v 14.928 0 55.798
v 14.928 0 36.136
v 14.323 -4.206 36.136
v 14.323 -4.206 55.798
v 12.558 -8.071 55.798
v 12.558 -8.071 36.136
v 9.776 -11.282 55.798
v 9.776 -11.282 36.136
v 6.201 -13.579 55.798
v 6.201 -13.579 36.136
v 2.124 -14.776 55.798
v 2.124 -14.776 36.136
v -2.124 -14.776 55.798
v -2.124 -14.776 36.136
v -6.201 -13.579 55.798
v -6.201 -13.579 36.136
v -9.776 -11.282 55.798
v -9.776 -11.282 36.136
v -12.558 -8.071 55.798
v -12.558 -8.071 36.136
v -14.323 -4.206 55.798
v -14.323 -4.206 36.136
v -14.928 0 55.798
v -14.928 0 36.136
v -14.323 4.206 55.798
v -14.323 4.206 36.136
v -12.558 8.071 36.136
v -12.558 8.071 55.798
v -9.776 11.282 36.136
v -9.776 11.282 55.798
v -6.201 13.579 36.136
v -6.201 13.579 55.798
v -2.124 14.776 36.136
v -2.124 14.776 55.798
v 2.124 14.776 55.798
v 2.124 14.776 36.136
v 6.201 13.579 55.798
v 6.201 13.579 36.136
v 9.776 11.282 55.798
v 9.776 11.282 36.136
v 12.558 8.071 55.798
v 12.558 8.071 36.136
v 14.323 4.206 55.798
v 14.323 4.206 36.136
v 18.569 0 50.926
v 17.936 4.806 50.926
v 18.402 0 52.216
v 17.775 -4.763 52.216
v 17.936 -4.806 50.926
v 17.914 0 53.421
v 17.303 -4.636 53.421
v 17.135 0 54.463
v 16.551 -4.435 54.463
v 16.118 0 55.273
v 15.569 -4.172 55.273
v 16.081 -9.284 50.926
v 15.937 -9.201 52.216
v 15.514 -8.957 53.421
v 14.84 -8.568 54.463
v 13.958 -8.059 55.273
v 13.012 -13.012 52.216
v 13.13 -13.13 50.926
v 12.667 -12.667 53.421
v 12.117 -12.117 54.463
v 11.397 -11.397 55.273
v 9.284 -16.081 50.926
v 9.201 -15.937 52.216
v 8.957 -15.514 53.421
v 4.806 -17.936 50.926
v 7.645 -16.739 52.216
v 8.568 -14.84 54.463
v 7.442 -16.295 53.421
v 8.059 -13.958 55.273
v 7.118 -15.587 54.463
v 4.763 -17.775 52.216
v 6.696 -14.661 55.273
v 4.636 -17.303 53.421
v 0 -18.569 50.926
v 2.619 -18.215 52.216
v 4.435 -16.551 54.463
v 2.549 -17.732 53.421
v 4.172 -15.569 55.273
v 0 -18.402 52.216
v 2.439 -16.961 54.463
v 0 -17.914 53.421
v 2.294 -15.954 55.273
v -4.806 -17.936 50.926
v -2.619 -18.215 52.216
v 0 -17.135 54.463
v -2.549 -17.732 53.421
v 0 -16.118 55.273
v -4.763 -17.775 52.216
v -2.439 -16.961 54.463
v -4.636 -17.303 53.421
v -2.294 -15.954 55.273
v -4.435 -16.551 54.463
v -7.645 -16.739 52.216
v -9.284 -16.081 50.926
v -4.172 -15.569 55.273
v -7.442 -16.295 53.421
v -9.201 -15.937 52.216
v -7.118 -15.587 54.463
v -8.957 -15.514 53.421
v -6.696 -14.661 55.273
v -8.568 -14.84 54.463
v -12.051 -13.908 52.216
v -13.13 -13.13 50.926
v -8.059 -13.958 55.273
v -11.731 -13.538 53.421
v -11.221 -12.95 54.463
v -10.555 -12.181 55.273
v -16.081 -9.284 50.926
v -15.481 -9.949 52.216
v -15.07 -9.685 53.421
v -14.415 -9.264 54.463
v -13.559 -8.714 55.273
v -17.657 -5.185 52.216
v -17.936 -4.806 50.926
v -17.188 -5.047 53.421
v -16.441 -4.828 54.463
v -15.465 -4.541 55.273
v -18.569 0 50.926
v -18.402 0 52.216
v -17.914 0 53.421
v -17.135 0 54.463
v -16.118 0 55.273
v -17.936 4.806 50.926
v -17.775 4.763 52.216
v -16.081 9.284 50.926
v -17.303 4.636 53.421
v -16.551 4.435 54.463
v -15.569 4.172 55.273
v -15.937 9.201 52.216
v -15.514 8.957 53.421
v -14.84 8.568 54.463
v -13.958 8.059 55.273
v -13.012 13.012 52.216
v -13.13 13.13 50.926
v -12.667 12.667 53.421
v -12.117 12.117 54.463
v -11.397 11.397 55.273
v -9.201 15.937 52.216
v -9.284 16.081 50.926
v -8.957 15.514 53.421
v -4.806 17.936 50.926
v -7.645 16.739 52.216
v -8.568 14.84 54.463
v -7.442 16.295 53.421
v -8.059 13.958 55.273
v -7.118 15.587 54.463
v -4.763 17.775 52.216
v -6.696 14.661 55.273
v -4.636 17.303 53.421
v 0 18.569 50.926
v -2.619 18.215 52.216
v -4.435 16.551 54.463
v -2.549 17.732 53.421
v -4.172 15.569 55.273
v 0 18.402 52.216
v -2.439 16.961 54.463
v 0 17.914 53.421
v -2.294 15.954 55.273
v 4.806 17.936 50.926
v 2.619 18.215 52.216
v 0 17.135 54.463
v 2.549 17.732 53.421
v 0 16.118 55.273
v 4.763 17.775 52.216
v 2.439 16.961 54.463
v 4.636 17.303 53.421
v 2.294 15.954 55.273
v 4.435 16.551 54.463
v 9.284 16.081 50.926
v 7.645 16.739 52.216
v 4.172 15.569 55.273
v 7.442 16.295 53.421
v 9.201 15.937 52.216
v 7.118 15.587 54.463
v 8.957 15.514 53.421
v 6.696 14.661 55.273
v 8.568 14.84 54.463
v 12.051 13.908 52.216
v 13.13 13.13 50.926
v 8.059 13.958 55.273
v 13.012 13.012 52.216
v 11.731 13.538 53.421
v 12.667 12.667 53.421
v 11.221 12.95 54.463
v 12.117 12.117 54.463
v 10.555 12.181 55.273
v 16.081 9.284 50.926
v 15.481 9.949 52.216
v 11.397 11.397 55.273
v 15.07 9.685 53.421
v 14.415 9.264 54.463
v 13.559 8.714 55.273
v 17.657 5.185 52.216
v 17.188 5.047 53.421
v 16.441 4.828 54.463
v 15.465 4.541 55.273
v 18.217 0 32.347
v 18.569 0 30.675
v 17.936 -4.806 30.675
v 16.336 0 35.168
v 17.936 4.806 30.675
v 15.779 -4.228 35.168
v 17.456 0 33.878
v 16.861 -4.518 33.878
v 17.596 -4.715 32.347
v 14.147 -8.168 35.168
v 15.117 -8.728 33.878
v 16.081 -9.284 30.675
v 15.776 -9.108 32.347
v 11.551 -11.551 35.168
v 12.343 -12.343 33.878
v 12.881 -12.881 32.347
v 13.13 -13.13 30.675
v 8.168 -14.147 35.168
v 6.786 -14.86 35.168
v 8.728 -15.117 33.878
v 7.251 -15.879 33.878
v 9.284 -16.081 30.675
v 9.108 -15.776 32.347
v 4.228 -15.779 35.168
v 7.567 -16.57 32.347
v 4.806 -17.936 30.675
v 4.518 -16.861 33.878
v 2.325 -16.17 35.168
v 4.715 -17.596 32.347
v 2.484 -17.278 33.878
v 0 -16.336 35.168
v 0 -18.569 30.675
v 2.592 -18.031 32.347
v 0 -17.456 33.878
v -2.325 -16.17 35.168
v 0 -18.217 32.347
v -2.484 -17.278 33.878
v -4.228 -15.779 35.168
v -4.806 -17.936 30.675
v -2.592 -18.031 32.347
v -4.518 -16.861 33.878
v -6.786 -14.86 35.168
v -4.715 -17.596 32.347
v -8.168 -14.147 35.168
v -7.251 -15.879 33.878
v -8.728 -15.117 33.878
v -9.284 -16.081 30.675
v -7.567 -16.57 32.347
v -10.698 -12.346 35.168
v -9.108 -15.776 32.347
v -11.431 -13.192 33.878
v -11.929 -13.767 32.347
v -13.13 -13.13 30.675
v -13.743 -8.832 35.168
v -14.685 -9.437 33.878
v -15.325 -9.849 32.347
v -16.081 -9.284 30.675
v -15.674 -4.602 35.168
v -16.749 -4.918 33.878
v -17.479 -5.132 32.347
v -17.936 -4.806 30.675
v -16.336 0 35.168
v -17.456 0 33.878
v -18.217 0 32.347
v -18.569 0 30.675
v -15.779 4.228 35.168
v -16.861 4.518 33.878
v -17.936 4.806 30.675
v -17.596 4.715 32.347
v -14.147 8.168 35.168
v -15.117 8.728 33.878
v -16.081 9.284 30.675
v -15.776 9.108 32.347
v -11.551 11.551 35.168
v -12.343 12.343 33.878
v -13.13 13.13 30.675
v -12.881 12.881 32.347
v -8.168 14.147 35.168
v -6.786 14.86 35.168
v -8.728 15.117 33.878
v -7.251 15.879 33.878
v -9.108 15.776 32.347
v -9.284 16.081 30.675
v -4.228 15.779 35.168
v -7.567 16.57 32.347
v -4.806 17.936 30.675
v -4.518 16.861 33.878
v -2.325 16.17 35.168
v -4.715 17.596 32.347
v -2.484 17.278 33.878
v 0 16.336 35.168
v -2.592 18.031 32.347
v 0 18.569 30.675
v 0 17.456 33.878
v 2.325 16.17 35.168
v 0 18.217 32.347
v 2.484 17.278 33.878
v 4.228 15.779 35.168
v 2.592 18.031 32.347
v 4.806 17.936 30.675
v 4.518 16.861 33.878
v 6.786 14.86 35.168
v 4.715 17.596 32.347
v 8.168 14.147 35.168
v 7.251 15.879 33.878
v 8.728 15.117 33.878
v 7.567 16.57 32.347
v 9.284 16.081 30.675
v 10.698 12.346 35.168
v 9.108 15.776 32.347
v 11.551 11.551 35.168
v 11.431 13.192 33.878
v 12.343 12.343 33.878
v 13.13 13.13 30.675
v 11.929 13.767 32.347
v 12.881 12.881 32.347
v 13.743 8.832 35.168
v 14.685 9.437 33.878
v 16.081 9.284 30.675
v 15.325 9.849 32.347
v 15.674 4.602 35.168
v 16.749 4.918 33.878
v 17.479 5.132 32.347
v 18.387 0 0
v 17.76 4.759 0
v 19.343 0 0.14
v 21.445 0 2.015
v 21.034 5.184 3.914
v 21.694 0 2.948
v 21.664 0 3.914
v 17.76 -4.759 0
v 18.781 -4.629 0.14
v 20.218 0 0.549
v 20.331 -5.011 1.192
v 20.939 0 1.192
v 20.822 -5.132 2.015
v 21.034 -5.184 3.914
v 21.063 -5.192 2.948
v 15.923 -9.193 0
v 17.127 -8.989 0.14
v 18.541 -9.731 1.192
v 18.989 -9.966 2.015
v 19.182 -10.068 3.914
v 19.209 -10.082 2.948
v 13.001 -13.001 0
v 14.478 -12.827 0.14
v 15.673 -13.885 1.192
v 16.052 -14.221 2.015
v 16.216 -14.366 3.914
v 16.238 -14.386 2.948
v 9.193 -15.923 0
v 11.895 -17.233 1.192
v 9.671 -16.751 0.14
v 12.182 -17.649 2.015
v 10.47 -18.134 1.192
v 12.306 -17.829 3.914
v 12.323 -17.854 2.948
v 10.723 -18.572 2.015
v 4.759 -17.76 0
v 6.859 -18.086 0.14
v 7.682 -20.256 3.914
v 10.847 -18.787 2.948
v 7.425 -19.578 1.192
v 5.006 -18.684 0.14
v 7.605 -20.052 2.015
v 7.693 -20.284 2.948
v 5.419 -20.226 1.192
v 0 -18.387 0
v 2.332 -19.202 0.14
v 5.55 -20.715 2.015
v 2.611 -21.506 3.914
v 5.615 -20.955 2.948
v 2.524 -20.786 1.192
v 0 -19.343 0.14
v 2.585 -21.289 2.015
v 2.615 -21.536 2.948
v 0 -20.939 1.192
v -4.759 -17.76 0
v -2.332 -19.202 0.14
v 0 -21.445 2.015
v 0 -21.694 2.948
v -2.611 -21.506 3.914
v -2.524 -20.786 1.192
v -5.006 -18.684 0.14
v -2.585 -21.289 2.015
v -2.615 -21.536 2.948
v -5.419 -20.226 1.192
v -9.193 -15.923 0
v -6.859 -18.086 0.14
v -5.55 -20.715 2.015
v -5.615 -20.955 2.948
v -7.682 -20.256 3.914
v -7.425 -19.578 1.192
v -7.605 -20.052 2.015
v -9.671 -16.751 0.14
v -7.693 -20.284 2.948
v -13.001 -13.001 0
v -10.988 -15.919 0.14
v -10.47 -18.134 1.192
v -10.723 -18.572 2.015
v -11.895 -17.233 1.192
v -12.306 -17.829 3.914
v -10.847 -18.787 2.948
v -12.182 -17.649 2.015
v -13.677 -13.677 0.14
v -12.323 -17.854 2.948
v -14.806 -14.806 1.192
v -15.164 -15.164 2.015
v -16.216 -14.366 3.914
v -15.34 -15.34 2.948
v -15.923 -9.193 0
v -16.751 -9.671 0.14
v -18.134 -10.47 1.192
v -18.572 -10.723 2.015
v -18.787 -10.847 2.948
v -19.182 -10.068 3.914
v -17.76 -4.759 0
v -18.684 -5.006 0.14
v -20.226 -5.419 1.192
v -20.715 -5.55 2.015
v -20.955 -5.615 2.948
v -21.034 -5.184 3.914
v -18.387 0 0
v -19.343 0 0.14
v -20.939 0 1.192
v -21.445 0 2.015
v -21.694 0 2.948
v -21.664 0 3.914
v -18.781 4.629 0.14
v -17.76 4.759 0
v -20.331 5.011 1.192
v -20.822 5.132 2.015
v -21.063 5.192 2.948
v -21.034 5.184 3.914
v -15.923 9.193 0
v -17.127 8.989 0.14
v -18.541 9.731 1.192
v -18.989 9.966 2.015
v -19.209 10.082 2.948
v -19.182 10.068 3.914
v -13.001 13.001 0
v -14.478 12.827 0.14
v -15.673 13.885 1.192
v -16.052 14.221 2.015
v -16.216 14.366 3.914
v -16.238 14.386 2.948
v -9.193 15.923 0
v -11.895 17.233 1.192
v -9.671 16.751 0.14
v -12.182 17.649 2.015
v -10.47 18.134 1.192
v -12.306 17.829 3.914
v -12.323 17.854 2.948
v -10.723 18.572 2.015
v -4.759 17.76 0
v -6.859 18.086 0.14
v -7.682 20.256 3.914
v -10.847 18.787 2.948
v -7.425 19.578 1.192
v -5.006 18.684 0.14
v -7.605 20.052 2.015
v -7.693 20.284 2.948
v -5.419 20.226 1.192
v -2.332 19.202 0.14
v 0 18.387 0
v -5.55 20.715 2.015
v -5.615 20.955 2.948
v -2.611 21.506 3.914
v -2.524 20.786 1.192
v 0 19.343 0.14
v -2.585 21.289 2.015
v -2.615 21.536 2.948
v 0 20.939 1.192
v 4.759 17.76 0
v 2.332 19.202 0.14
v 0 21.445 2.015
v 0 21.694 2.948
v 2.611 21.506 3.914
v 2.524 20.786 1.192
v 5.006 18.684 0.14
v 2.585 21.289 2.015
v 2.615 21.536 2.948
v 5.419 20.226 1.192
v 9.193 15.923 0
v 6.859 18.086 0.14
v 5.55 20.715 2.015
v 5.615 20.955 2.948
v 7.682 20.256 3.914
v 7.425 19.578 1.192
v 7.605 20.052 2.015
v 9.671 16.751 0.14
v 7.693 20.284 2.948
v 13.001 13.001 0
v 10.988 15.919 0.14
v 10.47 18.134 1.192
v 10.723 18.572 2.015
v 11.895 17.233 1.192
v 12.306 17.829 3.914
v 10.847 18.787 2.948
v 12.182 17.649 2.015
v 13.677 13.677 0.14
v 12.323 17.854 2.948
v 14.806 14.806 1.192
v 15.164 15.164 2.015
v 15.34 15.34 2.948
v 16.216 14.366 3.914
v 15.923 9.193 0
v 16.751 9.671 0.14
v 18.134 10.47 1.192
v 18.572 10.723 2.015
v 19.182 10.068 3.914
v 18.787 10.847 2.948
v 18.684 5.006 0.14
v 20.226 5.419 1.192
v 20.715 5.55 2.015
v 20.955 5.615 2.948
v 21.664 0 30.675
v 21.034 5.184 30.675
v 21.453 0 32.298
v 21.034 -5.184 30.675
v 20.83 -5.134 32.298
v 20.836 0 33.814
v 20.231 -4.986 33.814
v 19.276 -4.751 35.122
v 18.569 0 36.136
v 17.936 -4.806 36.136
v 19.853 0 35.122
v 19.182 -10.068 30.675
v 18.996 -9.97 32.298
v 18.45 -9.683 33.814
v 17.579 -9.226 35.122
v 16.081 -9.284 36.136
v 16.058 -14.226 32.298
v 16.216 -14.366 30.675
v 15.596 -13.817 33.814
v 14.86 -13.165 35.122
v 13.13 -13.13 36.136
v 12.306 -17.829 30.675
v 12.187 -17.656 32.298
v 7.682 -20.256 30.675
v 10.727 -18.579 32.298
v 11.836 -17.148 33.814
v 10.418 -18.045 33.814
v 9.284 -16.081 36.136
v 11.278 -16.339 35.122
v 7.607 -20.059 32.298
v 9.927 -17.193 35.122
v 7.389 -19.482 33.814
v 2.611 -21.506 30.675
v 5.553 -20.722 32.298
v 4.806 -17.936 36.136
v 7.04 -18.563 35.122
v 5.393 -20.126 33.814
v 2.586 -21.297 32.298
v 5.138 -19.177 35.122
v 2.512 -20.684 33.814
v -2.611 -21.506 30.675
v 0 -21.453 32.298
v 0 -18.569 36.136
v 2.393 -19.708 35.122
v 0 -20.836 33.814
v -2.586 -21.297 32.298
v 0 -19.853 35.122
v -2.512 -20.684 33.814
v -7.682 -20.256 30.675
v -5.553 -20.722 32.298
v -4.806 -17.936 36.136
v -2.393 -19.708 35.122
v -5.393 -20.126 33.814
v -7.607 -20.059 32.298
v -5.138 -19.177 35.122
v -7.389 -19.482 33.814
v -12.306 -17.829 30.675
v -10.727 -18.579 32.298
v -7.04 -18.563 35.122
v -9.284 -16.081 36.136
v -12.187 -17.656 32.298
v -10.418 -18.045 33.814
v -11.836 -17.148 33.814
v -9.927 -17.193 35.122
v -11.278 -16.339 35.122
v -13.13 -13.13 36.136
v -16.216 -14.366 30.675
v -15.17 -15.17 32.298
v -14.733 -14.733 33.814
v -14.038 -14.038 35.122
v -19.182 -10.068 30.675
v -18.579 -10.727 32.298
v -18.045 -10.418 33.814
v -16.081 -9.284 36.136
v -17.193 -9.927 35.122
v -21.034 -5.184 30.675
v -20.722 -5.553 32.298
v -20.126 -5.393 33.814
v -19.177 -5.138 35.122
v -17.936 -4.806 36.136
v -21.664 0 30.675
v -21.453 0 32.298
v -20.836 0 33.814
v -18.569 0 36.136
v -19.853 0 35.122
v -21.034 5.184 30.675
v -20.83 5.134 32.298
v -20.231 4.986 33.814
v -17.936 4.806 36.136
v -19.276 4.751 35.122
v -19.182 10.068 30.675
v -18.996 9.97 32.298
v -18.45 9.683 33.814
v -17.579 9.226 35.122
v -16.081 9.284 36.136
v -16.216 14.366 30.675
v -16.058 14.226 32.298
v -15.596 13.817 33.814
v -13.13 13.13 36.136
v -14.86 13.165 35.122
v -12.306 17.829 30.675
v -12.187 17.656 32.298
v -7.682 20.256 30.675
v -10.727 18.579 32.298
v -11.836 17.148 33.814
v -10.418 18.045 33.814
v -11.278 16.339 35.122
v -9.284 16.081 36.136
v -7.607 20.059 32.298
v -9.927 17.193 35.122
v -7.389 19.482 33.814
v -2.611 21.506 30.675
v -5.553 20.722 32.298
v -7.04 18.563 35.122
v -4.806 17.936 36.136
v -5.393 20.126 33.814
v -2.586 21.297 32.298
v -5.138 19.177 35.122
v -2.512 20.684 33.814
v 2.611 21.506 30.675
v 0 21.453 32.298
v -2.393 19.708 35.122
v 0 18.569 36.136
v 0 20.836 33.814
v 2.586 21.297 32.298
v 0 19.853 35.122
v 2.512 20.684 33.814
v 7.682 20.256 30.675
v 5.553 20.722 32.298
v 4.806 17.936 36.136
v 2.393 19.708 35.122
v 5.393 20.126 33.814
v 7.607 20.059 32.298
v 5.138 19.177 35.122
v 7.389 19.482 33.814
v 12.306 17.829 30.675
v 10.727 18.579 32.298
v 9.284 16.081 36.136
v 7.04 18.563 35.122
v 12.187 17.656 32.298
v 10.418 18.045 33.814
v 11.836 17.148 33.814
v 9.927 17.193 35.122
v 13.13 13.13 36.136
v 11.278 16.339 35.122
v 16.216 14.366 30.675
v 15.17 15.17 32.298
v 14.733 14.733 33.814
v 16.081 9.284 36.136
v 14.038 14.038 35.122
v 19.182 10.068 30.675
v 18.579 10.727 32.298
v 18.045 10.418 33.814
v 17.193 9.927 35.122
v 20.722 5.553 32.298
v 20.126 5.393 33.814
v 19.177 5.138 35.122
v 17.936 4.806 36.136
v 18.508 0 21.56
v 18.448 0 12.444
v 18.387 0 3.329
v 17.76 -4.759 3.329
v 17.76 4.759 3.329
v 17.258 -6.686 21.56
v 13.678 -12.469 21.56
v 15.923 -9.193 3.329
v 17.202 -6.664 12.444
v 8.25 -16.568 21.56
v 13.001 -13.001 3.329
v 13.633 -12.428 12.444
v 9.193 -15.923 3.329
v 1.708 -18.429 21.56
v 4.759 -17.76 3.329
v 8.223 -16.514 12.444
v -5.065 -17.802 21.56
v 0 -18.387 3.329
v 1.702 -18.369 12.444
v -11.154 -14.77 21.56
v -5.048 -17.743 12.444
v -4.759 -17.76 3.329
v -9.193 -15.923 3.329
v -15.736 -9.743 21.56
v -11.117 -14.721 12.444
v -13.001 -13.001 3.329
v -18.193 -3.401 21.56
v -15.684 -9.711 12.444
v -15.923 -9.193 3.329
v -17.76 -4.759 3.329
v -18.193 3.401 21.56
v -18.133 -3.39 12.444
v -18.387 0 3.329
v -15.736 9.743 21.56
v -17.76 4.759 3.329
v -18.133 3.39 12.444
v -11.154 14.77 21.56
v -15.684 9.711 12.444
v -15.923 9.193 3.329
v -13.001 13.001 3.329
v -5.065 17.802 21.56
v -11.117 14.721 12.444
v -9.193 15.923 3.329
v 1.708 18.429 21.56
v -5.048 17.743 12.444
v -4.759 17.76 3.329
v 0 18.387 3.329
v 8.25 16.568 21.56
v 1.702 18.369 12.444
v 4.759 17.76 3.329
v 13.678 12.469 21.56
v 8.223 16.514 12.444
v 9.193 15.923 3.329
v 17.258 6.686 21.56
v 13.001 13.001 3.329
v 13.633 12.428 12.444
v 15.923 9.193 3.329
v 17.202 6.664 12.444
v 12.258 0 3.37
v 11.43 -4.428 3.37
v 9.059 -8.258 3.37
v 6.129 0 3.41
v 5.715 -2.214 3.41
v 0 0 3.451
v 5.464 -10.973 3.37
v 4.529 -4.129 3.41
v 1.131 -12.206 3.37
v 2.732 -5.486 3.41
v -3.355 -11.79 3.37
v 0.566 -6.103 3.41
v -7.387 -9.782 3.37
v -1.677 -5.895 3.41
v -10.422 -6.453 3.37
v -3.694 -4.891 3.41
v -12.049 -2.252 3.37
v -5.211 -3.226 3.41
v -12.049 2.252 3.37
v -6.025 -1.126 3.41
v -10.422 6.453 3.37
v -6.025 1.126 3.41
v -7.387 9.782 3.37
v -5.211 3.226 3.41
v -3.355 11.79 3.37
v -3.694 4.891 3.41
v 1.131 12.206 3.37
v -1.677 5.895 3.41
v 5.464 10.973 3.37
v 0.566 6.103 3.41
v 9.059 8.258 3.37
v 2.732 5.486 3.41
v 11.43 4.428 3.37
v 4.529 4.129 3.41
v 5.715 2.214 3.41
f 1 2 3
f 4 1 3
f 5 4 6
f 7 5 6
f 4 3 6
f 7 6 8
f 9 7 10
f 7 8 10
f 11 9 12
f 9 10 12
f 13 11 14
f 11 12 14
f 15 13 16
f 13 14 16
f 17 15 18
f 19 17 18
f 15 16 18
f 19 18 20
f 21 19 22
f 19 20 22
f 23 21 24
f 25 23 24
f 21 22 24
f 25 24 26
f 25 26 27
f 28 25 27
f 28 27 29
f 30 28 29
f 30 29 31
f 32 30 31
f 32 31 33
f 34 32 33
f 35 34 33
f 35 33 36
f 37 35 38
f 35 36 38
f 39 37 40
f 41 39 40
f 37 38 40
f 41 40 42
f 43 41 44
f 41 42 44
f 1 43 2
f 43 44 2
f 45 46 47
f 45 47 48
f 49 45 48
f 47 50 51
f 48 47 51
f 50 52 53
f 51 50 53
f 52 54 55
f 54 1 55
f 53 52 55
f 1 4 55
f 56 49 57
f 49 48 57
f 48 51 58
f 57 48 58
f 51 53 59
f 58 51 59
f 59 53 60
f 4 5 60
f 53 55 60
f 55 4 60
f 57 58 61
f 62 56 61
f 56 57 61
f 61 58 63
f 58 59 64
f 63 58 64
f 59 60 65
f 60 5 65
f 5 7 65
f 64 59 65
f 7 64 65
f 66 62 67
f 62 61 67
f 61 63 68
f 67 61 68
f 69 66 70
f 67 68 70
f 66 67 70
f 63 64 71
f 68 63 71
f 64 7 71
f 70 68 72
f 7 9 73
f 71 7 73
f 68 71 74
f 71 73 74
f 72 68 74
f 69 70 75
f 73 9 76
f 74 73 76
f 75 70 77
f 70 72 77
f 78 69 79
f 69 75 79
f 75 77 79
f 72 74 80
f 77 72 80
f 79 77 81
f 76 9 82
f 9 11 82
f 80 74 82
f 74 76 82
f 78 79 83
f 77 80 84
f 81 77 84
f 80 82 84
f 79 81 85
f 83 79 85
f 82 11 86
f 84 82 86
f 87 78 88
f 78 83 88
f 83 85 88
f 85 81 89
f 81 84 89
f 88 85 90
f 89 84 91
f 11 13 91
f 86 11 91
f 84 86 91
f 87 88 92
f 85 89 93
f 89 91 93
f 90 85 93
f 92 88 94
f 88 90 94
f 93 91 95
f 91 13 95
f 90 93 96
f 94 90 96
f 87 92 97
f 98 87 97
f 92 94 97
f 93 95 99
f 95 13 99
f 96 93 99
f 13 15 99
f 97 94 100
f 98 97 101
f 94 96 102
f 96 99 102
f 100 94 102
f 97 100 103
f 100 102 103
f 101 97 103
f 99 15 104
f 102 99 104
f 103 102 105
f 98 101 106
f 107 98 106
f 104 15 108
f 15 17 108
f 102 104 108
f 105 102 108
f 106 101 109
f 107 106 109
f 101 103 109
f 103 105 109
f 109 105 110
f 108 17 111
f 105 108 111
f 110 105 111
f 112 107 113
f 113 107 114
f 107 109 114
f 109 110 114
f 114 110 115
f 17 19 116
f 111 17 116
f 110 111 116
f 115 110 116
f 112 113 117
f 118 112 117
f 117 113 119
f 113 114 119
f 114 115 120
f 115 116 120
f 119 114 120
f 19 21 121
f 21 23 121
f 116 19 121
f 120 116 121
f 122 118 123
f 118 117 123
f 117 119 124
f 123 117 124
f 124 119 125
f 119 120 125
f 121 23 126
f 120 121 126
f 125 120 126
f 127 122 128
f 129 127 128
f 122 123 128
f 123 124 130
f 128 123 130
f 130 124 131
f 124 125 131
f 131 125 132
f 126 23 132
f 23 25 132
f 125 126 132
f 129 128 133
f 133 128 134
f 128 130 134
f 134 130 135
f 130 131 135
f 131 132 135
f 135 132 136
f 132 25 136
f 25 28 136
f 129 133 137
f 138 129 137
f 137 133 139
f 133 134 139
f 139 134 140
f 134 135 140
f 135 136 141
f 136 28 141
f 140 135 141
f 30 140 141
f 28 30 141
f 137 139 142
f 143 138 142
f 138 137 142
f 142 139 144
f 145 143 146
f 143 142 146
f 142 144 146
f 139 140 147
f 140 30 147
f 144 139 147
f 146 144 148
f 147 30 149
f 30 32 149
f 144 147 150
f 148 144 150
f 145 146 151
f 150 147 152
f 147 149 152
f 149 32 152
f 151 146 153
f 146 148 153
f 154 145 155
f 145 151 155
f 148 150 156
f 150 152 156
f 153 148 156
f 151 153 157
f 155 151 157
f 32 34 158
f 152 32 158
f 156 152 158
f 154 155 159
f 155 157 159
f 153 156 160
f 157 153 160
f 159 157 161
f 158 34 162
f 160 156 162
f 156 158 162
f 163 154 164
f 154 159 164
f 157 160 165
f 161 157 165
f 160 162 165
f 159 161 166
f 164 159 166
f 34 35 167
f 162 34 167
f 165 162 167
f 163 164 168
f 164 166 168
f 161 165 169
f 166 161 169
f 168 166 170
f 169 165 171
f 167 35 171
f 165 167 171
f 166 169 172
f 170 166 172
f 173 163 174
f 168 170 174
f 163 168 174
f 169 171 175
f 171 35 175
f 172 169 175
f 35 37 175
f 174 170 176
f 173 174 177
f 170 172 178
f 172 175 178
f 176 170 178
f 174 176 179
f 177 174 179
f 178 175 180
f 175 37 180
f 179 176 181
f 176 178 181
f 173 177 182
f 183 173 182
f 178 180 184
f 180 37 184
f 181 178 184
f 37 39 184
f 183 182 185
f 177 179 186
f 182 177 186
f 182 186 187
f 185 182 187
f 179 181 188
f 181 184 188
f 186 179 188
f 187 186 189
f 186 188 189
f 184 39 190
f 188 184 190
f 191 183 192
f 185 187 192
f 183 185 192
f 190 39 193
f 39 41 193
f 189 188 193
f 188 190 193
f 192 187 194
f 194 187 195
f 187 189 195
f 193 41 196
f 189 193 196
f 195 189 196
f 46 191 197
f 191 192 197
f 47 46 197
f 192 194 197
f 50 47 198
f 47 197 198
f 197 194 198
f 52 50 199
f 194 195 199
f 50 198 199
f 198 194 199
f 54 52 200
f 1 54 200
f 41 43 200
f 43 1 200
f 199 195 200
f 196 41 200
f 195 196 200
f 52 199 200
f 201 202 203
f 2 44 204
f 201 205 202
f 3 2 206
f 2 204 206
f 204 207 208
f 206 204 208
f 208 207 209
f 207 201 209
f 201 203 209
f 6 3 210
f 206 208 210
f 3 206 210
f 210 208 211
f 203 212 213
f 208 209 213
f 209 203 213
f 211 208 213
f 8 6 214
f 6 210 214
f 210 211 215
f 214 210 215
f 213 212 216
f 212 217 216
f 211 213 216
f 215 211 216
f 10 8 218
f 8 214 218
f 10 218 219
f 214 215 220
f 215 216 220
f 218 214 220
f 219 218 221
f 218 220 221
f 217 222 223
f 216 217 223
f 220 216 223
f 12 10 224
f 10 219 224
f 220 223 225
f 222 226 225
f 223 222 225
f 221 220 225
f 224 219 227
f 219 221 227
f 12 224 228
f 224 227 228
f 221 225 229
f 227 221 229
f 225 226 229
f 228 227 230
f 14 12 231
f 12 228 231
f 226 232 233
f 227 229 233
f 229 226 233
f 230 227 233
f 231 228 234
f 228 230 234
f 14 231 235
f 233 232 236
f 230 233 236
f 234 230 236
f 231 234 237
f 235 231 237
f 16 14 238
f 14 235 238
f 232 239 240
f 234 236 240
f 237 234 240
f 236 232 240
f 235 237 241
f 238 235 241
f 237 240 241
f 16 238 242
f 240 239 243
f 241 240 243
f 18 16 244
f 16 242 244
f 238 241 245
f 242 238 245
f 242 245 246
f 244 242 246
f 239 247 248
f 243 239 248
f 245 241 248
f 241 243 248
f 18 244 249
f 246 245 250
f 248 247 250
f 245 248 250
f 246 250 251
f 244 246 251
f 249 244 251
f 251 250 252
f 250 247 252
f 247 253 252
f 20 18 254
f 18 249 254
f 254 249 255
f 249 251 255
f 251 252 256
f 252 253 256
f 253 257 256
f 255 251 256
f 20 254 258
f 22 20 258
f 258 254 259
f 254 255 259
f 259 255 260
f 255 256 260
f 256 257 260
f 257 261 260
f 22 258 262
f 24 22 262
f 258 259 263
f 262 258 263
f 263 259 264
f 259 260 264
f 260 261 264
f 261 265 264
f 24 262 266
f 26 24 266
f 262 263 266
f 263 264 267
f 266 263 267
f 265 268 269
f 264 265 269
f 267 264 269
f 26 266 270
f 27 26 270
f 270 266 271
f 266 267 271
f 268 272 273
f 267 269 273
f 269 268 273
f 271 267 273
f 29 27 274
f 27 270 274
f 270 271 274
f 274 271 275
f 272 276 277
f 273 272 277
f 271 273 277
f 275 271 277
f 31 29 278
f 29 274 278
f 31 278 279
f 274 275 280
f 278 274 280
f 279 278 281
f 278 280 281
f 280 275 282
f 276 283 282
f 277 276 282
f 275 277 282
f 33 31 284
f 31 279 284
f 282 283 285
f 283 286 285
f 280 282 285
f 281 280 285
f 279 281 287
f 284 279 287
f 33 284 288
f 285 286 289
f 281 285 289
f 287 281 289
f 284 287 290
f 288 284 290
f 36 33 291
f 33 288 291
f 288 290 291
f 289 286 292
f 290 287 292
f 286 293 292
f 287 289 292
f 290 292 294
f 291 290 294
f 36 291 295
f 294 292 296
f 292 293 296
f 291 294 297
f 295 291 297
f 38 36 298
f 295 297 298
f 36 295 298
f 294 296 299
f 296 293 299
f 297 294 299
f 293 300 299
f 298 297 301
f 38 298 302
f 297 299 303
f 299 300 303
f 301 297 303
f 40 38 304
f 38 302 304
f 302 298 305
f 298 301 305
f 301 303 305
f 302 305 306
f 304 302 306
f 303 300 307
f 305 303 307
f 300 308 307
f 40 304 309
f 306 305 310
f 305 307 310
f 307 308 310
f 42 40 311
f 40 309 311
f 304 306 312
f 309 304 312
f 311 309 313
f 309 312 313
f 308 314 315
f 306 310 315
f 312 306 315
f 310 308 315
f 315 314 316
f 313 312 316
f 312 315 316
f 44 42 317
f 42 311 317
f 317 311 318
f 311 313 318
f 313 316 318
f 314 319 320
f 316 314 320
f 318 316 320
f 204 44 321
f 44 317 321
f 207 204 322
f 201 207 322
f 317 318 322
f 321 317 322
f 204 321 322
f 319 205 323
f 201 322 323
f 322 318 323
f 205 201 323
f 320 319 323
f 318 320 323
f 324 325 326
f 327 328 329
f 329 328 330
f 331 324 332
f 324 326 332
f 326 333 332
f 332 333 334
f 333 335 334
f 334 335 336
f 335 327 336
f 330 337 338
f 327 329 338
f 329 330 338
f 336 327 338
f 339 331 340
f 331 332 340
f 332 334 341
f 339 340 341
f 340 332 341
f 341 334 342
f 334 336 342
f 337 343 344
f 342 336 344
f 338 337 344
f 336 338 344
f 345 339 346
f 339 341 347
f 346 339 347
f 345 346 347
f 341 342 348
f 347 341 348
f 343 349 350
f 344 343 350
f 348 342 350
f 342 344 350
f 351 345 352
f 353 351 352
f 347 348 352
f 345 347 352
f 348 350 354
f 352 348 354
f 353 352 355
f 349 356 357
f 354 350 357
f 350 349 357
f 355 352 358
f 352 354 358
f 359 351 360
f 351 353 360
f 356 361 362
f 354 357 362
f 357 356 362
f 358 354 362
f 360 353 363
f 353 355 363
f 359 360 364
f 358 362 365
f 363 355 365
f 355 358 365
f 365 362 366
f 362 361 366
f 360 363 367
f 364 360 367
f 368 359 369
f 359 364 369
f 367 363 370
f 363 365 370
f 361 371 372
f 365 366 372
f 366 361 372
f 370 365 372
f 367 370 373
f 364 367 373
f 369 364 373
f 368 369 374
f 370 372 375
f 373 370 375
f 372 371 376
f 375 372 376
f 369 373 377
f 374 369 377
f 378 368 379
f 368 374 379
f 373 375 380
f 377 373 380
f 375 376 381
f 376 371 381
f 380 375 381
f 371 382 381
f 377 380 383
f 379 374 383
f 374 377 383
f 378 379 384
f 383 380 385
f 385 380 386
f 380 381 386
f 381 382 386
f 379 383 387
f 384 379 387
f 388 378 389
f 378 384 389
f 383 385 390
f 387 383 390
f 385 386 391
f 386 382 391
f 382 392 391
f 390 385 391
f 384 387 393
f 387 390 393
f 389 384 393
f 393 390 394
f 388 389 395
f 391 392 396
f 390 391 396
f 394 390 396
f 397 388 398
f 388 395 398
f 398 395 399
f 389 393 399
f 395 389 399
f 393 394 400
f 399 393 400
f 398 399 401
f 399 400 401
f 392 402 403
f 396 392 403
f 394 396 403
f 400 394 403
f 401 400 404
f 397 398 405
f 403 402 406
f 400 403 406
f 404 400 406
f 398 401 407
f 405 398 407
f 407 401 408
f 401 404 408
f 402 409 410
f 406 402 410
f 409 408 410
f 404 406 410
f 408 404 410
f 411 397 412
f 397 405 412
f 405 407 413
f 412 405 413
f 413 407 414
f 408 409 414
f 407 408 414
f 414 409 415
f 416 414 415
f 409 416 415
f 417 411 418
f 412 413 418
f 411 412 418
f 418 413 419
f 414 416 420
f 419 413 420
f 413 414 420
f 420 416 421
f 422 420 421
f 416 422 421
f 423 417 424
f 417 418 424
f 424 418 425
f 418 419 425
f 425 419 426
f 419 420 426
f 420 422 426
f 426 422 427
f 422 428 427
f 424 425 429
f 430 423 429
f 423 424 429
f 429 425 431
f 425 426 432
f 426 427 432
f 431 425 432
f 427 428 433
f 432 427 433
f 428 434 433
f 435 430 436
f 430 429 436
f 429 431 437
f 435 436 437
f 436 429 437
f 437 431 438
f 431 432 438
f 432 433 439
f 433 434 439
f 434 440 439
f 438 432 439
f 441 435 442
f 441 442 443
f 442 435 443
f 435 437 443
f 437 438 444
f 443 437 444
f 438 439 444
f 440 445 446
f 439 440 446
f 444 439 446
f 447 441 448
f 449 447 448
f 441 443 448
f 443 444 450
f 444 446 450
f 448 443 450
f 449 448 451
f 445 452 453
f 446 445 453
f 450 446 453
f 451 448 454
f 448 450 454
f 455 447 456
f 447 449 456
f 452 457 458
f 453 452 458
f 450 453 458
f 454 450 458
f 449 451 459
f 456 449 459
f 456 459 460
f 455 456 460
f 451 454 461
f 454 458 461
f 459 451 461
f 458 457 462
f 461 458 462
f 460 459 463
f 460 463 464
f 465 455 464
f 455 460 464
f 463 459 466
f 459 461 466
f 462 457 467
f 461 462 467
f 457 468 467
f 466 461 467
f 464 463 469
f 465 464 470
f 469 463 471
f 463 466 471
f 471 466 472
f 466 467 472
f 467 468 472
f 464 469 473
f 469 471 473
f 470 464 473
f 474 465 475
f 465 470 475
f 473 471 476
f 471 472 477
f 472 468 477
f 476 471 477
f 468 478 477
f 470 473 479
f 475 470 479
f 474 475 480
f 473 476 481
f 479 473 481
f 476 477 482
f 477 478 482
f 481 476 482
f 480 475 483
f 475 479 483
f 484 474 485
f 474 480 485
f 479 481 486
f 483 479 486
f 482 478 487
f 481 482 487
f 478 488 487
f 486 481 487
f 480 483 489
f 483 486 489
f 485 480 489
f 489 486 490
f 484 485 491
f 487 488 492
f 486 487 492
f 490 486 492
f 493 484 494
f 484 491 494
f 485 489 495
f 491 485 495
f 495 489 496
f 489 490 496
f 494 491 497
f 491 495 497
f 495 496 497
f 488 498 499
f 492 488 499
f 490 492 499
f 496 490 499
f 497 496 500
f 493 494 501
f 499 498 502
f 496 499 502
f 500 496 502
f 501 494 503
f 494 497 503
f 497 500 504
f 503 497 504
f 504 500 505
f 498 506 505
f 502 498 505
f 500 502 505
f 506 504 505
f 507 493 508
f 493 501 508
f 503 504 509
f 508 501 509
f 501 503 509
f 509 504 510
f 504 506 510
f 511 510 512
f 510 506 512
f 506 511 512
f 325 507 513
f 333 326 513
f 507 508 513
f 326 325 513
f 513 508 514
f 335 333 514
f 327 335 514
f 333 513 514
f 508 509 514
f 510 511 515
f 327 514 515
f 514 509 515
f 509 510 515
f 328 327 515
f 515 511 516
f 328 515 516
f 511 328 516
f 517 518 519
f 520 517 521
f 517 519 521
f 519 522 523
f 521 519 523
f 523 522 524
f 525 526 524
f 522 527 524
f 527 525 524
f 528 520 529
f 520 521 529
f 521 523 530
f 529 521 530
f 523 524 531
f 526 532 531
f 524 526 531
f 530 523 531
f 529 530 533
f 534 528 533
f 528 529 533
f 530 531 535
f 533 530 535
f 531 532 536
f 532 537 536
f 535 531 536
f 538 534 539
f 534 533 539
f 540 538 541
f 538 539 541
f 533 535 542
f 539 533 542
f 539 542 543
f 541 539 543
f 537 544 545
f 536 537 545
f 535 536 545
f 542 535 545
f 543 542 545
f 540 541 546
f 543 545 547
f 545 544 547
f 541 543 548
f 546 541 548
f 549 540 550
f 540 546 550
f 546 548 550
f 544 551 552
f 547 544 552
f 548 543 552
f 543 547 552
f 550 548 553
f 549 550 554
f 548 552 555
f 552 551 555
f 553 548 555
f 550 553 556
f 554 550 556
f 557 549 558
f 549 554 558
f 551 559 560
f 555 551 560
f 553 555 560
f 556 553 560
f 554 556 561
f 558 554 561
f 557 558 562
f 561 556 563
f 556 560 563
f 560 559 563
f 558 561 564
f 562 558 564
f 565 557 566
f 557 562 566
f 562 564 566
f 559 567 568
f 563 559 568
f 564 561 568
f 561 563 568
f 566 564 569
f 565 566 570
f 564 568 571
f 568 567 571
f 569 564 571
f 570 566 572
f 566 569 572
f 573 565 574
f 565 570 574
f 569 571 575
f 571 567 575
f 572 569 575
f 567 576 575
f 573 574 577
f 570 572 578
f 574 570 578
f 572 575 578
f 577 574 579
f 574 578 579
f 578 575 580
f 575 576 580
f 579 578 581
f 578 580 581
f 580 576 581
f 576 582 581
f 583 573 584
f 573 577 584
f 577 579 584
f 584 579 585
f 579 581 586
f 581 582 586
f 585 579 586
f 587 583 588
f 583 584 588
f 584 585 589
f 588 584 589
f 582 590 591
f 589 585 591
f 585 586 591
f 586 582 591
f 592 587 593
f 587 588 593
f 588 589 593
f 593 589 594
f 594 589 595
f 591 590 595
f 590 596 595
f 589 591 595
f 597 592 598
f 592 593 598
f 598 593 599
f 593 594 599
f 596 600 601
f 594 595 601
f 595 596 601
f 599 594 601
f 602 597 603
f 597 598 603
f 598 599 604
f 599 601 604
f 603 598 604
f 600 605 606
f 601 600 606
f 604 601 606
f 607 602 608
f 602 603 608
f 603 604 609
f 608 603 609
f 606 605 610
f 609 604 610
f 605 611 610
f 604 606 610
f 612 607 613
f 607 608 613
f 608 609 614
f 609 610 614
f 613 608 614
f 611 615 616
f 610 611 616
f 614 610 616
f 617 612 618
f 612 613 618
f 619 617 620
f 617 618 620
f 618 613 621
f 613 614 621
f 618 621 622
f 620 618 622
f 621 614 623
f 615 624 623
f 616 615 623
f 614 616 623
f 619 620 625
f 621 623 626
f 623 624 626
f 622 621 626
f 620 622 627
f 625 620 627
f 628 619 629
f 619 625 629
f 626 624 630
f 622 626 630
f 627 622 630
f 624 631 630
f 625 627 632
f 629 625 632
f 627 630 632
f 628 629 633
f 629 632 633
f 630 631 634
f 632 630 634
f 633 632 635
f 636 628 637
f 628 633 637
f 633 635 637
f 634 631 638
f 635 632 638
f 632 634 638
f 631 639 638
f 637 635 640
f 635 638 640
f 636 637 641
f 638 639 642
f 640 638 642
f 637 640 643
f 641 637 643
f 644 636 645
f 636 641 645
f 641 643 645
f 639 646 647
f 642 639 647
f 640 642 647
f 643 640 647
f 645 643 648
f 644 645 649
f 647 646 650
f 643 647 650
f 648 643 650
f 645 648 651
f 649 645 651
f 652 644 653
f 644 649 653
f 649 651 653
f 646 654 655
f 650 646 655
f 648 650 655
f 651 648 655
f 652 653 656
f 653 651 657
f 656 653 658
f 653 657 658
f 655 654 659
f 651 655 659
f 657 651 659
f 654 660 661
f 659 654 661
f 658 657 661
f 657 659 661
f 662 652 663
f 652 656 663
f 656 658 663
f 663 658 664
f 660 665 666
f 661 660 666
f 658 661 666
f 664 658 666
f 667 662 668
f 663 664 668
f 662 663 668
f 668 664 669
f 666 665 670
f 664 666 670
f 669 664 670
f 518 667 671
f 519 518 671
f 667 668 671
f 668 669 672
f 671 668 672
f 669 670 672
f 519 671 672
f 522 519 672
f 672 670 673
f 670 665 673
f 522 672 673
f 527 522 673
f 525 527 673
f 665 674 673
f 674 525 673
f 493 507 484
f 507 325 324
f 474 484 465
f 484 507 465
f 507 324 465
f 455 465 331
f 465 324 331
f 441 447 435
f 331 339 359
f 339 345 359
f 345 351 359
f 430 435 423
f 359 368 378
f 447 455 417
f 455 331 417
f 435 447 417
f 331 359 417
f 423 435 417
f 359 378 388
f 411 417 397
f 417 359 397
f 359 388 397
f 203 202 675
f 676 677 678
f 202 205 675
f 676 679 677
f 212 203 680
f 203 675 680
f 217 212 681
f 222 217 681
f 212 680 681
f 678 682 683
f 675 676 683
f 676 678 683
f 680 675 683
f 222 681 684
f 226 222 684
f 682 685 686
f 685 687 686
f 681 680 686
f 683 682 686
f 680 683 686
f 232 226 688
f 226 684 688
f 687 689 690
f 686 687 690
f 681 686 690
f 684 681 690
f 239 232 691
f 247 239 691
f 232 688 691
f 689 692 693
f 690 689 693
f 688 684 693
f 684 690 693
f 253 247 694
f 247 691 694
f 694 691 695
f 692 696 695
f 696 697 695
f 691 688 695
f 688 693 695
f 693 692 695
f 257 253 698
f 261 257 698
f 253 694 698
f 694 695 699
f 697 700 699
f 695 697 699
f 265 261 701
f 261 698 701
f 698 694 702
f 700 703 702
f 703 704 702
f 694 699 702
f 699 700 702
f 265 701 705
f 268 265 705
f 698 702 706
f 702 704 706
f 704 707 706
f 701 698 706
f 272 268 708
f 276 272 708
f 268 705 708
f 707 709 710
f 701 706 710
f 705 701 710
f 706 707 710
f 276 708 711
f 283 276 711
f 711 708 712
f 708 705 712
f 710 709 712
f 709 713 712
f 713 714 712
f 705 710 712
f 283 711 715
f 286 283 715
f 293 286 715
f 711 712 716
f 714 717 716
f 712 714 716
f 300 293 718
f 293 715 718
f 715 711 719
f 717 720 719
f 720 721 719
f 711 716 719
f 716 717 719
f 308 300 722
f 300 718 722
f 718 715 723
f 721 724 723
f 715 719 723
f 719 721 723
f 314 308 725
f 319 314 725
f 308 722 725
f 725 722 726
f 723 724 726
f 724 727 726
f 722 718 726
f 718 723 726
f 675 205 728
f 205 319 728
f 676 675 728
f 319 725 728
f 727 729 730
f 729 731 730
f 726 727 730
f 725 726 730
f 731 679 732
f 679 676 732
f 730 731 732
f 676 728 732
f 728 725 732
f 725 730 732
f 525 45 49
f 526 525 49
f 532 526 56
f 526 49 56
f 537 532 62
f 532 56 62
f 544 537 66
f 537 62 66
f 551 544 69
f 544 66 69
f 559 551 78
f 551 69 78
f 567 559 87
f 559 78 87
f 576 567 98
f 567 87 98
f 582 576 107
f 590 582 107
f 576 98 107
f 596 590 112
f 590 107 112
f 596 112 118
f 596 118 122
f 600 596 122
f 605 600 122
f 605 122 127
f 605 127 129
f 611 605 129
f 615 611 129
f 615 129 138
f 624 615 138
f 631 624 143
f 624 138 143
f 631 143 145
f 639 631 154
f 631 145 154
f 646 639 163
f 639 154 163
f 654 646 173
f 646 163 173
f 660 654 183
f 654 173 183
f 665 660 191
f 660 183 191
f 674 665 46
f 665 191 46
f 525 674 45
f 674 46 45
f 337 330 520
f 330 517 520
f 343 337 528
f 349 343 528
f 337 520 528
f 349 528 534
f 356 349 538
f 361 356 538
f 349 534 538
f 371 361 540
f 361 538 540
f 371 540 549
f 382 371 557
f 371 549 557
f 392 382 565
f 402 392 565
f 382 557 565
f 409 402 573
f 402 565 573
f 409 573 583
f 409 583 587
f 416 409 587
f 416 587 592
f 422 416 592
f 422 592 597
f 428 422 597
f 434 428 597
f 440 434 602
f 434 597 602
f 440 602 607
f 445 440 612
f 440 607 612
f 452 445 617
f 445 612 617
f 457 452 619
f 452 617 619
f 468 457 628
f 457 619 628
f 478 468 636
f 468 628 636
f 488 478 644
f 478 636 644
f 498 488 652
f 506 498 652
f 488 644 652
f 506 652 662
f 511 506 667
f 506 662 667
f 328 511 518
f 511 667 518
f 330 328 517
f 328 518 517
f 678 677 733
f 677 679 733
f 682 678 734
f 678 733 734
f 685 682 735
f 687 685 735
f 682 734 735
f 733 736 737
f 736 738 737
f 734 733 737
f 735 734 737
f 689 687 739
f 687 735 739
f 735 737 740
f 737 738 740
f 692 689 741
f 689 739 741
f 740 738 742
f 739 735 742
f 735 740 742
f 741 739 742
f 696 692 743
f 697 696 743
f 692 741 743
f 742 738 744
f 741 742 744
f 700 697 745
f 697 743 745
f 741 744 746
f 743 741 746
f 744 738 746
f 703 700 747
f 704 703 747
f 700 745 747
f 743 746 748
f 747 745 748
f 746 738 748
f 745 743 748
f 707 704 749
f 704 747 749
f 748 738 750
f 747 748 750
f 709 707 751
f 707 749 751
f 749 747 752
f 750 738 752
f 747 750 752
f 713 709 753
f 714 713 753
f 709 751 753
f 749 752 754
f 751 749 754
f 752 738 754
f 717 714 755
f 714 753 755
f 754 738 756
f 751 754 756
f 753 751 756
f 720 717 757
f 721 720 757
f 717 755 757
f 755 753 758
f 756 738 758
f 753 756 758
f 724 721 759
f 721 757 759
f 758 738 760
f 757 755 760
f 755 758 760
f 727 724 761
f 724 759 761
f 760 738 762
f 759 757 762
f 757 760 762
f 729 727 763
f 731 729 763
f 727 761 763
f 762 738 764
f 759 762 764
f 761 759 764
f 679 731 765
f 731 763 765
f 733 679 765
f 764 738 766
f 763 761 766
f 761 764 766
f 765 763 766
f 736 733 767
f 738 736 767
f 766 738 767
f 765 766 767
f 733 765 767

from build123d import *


# Not quite as in the source:
# - a fillet or chamfer that OpenCascade refuses, or shapes differently, is made with other operations: its cross-section is extruded or revolved along the edge and cut away or added


with BuildPart() as f1:
    # F0 (on Front) → F1 (revolve)
    with BuildSketch(Plane.XZ):
        with BuildLine():
            Line((0, 3.4511274384), (0, 0))
            Line((0, 0), (18.3868259192, 0))
            ThreePointArc((18.3868259192, 0), (20.9391502019, 1.1918933999), (21.6636881232, 3.9140274748))
            Line((21.6636881232, 3.9140274748), (21.6636881232, 30.6750517339))
            ThreePointArc((21.6636881232, 30.6750517339), (20.8362073086, 33.8137273466), (18.5688734055, 36.1364856362))
            Line((18.5688734055, 36.1364856362), (18.5688734055, 55.7976476848))
            Line((18.5688734055, 55.7976476848), (14.9279180914, 55.7976476848))
            Line((14.9279180914, 55.7976476848), (14.9279180914, 36.1364856362))
            ThreePointArc((14.9279180914, 36.1364856362), (17.4559954455, 33.877501736), (18.5688734055, 30.6750517339))
            Line((18.5688734055, 30.6750517339), (18.3868259192, 3.3287243314))
            Line((18.3868259192, 3.3287243314), (0, 3.4511274384))
        make_face()
    revolve(axis=Axis((0, 0, 1.7255637192), (0, 0, -1)))

    # F2: fillet of radius 5.08 on 1 edges, made by hand

    # F2_s1 → F2_t2 (revolve, cut)
    with BuildSketch(Plane.XZ):
        with BuildLine():
            ThreePointArc((18.5688734055, 50.9257332365), (17.5580715454, 53.9667900425), (14.9279180914, 55.7976476848))
            Line((14.9279180914, 55.7976476848), (18.5688734055, 55.7976476848))
            Line((18.5688734055, 55.7976476848), (18.5688734055, 50.9257332365))
        make_face()
    revolve(axis=Axis((0, 0, 55.7976476848), (0, 0, -1)), mode=Mode.SUBTRACT)


solid = f1.part
